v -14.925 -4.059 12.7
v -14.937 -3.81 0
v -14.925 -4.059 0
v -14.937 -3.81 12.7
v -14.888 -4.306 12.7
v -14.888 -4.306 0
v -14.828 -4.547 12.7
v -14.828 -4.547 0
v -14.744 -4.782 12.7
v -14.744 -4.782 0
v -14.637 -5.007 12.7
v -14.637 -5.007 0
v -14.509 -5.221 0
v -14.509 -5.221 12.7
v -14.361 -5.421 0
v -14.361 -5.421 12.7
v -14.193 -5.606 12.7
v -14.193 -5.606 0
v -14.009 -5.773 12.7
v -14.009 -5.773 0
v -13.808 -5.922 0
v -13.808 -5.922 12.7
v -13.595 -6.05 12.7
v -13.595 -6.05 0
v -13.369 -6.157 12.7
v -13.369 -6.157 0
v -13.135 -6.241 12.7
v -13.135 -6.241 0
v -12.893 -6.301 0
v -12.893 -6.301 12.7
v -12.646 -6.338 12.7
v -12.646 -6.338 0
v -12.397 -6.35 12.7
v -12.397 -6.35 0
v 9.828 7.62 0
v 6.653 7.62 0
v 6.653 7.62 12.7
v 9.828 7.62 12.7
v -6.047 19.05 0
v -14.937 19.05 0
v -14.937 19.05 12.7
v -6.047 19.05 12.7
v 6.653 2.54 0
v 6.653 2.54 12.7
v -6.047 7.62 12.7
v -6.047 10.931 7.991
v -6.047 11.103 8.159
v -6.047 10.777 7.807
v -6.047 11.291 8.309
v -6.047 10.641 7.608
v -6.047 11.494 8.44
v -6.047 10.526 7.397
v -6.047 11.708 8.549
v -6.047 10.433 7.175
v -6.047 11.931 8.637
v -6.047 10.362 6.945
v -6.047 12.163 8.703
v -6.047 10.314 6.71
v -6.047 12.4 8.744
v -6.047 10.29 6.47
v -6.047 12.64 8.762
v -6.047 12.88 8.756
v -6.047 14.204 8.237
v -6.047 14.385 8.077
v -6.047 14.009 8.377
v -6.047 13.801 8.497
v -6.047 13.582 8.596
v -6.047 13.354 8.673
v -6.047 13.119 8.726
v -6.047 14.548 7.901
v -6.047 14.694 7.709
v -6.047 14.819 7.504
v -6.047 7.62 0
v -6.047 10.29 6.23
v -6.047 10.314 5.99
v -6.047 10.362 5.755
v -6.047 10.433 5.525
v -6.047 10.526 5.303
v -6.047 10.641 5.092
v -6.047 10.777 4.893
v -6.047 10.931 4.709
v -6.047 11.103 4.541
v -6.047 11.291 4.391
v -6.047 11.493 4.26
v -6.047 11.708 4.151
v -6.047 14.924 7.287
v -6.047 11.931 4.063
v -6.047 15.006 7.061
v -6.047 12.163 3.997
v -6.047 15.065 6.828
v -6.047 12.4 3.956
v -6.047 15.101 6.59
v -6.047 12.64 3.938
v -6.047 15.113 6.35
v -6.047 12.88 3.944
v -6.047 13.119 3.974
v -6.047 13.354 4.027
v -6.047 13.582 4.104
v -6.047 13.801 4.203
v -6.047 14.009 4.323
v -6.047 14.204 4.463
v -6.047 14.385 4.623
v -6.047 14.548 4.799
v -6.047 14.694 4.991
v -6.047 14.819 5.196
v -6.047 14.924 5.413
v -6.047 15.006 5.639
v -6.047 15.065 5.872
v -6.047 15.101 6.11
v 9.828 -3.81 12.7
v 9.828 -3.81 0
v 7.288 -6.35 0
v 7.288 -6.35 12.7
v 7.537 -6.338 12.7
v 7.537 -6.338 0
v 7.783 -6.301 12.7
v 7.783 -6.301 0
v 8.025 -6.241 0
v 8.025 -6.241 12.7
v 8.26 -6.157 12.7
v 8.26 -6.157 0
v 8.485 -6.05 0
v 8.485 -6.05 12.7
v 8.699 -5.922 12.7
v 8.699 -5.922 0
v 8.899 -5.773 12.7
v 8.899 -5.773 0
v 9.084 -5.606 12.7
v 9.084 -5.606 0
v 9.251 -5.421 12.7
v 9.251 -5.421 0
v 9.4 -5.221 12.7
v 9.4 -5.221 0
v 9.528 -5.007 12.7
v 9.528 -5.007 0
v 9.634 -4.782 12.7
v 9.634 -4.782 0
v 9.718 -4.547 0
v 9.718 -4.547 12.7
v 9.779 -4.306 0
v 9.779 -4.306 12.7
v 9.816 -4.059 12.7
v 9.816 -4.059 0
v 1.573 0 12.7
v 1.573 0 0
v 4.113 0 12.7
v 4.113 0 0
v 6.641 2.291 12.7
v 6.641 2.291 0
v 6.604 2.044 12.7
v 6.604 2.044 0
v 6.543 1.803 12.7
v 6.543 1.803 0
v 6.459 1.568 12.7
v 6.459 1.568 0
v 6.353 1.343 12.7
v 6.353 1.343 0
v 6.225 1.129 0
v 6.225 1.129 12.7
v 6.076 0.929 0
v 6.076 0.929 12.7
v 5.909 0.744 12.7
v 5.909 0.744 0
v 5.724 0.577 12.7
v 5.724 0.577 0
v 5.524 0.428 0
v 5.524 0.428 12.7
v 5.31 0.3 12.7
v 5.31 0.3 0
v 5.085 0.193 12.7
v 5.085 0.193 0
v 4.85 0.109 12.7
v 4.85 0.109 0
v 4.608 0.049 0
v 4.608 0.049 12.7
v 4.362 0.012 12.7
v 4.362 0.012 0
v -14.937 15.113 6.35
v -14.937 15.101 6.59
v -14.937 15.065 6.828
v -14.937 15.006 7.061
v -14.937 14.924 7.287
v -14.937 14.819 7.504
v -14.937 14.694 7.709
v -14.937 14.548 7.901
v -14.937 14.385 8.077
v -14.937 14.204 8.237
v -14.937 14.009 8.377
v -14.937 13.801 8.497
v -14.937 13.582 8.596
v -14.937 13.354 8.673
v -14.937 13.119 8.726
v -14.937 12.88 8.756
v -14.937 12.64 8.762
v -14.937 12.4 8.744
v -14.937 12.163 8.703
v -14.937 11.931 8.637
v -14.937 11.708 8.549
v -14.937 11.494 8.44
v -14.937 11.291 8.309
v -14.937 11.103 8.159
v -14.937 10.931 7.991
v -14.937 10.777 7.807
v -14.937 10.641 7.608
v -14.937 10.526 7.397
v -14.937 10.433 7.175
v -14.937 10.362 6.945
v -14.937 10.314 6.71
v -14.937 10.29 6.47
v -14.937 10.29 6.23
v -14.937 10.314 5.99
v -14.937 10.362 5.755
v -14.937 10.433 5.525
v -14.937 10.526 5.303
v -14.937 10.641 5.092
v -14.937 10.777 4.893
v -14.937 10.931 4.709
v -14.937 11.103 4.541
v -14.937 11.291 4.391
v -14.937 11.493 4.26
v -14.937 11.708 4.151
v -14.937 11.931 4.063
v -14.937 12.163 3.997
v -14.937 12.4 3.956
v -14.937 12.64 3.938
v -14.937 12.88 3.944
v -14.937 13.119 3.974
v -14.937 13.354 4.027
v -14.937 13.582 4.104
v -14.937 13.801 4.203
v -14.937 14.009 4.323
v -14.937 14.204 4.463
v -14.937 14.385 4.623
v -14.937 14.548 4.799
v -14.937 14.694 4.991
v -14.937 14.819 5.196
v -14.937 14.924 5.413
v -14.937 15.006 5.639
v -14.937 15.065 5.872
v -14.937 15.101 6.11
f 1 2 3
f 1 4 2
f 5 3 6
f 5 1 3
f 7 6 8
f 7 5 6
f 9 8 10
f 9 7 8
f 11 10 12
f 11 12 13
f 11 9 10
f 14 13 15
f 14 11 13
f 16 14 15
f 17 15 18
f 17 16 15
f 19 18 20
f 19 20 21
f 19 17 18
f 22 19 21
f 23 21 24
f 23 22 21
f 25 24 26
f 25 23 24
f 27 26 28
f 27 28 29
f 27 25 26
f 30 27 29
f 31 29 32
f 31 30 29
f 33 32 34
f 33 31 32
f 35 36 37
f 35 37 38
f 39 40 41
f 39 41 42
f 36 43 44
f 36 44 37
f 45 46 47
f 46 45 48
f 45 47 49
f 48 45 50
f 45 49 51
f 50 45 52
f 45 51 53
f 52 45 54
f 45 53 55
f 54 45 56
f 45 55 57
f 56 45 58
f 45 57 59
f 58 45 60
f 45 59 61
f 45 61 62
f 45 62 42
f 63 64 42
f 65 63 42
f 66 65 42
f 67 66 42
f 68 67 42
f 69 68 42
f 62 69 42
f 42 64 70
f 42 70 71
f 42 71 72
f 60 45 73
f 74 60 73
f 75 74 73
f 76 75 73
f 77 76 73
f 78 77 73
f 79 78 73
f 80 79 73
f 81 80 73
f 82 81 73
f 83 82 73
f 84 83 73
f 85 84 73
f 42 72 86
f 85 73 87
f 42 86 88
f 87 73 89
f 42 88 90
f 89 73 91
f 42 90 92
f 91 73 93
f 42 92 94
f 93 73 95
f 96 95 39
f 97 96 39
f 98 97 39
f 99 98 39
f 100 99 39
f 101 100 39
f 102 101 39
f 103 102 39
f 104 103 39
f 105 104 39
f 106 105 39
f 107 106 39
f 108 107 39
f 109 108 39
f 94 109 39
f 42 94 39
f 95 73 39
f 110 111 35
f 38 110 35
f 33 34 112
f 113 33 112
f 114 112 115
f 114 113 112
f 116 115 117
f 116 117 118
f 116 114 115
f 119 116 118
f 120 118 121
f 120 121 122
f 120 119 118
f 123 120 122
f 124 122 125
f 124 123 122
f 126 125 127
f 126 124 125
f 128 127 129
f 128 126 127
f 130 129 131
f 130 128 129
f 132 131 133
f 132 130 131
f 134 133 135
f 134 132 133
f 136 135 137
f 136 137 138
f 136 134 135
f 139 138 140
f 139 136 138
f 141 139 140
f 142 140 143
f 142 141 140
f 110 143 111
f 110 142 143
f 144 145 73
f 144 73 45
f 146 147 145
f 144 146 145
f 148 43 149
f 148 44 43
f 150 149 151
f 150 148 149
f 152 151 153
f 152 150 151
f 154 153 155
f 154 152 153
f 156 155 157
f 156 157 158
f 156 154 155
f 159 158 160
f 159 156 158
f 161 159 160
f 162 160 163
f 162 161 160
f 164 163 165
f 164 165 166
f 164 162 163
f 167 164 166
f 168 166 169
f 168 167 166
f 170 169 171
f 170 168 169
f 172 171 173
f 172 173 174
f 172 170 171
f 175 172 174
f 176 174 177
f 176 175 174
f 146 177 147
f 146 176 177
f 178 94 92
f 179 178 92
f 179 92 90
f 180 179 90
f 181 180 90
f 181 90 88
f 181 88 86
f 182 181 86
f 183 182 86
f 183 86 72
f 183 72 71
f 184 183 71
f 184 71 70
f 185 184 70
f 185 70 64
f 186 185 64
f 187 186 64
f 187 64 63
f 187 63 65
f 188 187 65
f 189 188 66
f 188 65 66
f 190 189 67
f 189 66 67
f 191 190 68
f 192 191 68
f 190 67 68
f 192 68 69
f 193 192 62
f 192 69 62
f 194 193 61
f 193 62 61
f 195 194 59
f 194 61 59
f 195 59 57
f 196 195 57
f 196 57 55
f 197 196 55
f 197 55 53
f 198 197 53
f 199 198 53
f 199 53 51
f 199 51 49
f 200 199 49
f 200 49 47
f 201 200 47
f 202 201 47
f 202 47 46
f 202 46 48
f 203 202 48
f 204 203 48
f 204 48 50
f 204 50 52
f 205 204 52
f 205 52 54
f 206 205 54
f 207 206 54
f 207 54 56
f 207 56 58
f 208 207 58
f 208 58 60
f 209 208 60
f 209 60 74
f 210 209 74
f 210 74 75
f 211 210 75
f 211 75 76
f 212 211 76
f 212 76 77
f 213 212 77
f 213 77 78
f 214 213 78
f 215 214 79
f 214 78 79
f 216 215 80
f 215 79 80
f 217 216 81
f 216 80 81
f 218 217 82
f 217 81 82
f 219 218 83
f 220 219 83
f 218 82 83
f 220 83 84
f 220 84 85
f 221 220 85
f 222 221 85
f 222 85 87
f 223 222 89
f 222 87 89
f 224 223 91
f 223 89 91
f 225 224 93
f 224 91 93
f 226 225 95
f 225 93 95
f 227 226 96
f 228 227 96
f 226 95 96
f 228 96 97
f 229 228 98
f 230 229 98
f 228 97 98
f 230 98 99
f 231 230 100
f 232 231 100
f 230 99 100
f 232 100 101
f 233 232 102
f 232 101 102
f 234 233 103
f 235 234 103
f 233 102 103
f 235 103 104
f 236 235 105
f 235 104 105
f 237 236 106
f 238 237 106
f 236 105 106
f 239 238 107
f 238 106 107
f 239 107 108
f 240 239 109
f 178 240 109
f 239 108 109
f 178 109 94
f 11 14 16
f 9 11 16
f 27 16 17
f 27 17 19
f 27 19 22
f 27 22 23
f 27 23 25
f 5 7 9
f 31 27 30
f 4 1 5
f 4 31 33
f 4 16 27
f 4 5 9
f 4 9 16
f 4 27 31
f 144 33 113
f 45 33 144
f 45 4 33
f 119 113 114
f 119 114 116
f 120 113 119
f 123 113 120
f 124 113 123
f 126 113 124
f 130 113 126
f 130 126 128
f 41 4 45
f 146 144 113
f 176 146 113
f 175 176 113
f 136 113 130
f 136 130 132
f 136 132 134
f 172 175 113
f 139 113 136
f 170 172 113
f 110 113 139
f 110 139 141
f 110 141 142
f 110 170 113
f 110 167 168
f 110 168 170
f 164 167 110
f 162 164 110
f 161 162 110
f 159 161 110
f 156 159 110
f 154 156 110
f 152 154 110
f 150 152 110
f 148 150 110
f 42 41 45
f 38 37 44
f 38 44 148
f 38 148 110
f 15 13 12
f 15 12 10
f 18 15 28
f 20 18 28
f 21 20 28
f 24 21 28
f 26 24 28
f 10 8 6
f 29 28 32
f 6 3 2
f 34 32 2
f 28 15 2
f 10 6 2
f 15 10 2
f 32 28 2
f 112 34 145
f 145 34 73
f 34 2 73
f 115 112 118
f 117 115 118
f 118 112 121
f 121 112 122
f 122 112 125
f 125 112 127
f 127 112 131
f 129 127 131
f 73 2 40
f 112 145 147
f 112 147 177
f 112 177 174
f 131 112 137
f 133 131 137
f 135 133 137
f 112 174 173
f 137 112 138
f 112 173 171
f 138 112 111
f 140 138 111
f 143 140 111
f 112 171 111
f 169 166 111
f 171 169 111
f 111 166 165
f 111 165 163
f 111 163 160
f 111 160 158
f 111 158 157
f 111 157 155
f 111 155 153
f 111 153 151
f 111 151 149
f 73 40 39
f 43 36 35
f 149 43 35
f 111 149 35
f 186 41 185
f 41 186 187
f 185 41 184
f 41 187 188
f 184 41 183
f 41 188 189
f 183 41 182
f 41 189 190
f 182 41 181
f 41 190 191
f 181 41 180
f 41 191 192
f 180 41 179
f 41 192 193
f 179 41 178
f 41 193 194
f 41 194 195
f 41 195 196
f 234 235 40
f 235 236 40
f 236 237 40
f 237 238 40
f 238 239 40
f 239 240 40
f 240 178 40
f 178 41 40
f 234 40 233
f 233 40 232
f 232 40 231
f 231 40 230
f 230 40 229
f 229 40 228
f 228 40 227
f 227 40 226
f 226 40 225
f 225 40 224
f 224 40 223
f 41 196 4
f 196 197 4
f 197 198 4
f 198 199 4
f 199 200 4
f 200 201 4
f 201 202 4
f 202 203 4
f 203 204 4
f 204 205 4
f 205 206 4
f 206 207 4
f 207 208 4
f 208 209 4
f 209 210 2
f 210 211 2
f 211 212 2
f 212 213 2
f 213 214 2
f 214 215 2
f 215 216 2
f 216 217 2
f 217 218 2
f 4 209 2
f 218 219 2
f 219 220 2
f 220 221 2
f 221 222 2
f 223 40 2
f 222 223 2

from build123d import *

# Parameters (mm, degrees)
F0_W     = 8.89
F0_H     = 19.05
F0_W_2   = 3.175
F0_H_2   = 7.62
F1_DEPTH = 12.7
F2_R     = 2.54
F3_R     = 2.413
F4_DEPTH = 25.4
F5_SIZE  = 7.62


with BuildPart() as f1:
    # F0 (on Top) → F1 (new body)
    with BuildSketch(Plane.XY):
        with Locations((-10.492269, 9.525)):
            Rectangle(F0_W, F0_H)
        Polygon((-6.047269, 0), (-14.937269, 0), (-14.937269, -6.35), (9.827731, -6.35), (9.827731, 0), (6.652731, 0), align=None)
        with Locations((8.240231, 3.81)):
            Rectangle(F0_W_2, F0_H_2)
    extrude(amount=F1_DEPTH)

    # F2
    f2_edges = [f1.edges().sort_by_distance(p)[0] for p in [
        (6.652731, 0, 6.35),
        (9.827731, -6.35, 6.35),
        (-14.937269, -6.35, 6.35),
    ]]
    fillet(f2_edges, radius=F2_R)

    # F3 (on face) → F4 (cut)
    with BuildSketch(Plane.YZ.offset(-6.047269)):
        with Locations((12.7, 6.35)):
            Circle(F3_R)
    extrude(amount=-F4_DEPTH, mode=Mode.SUBTRACT)

    # F5
    f5_edges = [f1.edges().sort_by_distance(p)[0] for p in [
        (-6.047269, 0, 6.35),
    ]]
    chamfer(f5_edges, length=F5_SIZE)


solid = f1.part
